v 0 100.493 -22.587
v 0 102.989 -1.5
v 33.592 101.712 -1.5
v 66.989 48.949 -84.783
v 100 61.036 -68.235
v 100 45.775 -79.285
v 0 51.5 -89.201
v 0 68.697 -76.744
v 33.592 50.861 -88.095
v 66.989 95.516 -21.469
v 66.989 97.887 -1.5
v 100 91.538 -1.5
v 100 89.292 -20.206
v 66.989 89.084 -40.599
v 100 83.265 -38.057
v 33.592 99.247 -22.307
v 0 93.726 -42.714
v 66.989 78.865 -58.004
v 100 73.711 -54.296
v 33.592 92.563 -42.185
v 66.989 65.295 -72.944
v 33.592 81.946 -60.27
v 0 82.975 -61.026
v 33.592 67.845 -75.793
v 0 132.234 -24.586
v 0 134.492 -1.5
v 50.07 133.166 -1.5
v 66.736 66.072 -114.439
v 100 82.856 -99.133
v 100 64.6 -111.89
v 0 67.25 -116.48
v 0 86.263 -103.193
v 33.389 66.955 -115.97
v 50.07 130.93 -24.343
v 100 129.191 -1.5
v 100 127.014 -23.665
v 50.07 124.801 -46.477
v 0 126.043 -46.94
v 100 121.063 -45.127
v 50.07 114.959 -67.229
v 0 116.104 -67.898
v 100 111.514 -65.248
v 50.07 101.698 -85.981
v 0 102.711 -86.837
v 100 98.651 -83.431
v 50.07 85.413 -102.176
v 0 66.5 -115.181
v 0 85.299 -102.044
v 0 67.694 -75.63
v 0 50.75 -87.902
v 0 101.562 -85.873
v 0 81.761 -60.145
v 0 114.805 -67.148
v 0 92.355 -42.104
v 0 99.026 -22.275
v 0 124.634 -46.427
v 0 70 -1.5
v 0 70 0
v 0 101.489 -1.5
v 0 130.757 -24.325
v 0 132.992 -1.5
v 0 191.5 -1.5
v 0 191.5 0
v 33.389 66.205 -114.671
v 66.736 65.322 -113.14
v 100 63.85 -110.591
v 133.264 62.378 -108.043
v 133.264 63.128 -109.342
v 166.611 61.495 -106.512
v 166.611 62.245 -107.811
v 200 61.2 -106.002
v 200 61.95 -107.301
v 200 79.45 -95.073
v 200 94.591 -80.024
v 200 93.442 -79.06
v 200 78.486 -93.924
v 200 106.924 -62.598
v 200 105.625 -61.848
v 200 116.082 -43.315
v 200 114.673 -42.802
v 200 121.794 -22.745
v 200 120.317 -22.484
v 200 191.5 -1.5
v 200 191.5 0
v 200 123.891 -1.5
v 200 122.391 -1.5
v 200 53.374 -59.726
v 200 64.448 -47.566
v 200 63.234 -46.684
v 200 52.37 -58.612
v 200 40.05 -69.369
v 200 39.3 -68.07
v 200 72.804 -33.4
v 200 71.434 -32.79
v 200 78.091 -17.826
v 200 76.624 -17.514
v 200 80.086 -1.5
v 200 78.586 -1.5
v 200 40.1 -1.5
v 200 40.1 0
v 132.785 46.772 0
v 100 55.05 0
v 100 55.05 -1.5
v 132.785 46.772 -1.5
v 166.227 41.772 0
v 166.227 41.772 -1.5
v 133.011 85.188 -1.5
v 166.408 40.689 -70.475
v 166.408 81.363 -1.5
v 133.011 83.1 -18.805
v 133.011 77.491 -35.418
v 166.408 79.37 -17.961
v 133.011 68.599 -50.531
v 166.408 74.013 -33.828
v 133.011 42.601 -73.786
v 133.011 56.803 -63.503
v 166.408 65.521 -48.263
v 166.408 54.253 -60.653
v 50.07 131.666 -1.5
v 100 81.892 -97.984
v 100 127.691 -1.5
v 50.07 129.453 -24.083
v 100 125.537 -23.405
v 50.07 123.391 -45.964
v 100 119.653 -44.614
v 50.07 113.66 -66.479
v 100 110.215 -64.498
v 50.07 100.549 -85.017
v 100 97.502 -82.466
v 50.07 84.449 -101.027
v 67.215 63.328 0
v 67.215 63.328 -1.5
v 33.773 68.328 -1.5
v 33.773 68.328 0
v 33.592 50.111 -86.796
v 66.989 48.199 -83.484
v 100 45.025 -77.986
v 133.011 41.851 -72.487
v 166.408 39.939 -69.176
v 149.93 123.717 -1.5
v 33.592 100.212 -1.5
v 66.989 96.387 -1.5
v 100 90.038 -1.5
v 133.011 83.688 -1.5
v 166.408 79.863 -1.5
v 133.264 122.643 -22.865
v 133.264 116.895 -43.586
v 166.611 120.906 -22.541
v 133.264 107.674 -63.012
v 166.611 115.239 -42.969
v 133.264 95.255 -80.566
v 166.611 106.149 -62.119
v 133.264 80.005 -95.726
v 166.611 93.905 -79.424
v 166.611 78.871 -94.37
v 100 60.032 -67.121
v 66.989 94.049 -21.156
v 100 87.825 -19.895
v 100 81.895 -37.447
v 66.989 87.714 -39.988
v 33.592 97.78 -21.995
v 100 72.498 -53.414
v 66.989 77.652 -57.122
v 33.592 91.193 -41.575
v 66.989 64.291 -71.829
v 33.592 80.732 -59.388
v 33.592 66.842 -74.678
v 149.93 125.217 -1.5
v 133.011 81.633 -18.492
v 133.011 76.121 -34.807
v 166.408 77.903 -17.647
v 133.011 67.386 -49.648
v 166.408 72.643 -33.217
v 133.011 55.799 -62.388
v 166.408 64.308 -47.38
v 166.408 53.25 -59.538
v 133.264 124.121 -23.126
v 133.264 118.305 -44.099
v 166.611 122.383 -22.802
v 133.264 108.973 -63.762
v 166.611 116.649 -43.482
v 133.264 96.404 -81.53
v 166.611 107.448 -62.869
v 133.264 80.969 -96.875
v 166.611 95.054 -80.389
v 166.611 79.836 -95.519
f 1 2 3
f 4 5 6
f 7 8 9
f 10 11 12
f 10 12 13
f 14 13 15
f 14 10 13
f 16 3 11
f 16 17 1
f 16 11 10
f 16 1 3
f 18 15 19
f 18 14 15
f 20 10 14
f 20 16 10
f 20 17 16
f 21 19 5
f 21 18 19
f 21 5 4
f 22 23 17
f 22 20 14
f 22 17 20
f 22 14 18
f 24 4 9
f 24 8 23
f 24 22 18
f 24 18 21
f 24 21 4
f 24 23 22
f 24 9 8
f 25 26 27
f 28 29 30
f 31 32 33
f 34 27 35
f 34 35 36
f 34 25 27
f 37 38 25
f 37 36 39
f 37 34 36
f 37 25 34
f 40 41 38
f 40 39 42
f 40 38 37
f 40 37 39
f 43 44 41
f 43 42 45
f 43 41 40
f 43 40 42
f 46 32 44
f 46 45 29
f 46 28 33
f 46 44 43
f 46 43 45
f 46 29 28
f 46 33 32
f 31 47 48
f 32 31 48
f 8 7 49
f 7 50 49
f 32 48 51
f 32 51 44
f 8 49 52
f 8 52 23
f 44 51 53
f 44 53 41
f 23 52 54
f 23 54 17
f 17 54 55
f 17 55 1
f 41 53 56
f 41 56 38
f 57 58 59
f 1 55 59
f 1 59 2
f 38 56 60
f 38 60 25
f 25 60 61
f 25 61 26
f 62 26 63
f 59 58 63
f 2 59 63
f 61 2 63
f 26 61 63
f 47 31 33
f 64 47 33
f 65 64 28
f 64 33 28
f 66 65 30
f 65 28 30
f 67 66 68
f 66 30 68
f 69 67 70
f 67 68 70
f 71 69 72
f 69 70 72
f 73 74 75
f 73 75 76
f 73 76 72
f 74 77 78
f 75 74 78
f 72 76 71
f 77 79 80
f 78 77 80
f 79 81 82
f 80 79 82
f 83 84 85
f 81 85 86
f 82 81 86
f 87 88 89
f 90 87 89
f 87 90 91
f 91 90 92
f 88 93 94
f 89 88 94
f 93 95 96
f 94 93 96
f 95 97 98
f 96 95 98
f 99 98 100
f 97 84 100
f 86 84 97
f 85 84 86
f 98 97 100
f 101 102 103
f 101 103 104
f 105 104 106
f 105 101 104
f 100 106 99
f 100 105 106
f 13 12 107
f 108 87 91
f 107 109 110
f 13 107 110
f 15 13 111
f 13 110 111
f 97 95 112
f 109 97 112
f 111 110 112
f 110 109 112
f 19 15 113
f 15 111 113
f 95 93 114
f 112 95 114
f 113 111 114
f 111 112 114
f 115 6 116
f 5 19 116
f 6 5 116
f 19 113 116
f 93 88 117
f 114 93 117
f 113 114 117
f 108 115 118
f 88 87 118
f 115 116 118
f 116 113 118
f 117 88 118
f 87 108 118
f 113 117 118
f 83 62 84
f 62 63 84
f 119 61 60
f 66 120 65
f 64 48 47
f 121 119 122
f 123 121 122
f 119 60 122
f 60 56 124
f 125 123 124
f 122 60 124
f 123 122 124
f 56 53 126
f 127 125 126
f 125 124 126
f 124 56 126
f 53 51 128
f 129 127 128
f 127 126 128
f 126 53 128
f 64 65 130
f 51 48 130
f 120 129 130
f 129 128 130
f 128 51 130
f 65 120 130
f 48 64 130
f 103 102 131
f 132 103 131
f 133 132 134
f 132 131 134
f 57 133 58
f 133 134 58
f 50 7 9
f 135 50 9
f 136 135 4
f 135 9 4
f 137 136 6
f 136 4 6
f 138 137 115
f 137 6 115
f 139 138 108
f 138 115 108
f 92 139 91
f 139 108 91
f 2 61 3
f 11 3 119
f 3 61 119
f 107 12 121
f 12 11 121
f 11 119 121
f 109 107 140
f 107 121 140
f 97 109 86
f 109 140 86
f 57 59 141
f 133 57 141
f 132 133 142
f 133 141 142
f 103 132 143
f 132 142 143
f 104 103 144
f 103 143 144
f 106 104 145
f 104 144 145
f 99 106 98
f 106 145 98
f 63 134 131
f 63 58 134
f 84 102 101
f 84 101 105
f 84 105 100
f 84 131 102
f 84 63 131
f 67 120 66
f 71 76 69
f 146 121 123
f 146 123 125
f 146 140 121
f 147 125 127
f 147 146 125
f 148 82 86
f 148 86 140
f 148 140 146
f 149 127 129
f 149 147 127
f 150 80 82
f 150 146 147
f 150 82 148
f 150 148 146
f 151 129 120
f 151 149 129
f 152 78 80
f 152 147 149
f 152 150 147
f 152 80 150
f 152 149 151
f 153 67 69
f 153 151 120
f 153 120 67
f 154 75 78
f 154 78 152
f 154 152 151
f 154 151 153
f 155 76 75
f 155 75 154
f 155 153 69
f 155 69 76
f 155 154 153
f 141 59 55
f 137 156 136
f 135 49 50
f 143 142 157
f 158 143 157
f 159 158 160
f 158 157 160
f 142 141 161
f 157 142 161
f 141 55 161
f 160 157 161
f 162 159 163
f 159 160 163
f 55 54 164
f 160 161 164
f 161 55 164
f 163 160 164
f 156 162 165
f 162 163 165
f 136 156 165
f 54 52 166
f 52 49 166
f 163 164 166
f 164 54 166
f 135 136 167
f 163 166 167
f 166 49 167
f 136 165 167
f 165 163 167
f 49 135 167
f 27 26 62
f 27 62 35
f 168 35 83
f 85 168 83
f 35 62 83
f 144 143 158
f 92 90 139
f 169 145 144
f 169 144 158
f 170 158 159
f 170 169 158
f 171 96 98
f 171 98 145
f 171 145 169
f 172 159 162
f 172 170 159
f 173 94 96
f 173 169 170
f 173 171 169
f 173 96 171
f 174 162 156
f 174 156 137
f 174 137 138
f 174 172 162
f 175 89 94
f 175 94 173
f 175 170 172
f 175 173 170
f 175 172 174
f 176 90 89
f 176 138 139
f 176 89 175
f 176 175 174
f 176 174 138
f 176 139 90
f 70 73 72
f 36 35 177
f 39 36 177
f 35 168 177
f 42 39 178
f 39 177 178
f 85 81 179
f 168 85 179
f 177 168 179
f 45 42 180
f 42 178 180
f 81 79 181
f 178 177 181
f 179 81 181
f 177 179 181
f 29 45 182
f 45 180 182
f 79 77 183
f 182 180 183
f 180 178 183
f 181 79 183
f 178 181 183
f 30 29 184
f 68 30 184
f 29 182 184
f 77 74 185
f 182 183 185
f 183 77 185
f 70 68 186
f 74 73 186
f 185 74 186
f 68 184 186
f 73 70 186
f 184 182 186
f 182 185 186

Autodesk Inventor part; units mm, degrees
ref_plane "YZ Plane" through (0, 0, 0) normal (1, 0, 0) x (0, 1, 0)
ref_plane "XZ Plane" through (0, 0, 0) normal (0, 1, 0) x (-1, 0, 0)
ref_plane "XY Plane" through (0, 0, 0) normal (0, 0, 1) x (1, 0, 0)
sketch "Skizze1" plane through (0, 0, 0) normal (0, 0, 1) x (1, 0, 0)
  line L0 (0, 0) -> (200, 0) construction
  line L1 (200, 0) -> (200, 40.1) construction
  line L2 (200, 40.1) -> (200, 41.6)
  line L3 (0, 0) -> (0, 70) construction
  line L4 (0, 70) -> (0, 71.5)
  arc A0 (100, 55.05) -> (0, 70) centre (0, -271.9232) ccw
  arc A1 (100, 55.05) -> (200, 40.1) centre (200, 382.0232) ccw
  arc A2 (100, 56.55) -> (0, 71.5) centre (0, -270.4232) ccw
  arc A3 (100, 56.55) -> (200, 41.6) centre (200, 383.5232) ccw
  line L5 (0, 71.5) -> (0, 101.5) construction
  line L6 (200, 41.6) -> (200, 78.6) construction
  line L7 (0, 101.5) -> (0, 103)
  line L8 (200, 78.6) -> (200, 80.1)
  line L9 (0, 103) -> (0, 133) construction
  line L10 (0, 133) -> (0, 134.5)
  line L11 (200, 80.1) -> (200, 122.4) construction
  line L12 (200, 122.4) -> (200, 123.9)
  arc A4 (100, 90.05) -> (200, 78.6) centre (200, 521.0062) ccw
  arc A5 (100, 91.55) -> (200, 80.1) centre (200, 522.5062) ccw
  arc A6 (100, 90.05) -> (0, 101.5) centre (0, -340.9062) ccw
  arc A7 (100, 91.55) -> (0, 103) centre (0, -339.4062) ccw
  arc A8 (100, 129.2) -> (200, 123.9) centre (200, 1069.9462) ccw
  arc A9 (100, 127.7) -> (0, 133) centre (0, -813.0462) ccw
  arc A10 (100, 127.7) -> (200, 122.4) centre (200, 1068.4462) ccw
  arc A11 (100, 129.2) -> (0, 134.5) centre (0, -811.5462) ccw
  line L13 (0, 0) -> (0, 190) construction
  line L14 (0, 190) -> (200, 190) construction
  line L15 (200, 190) -> (200, 191.5) construction
  line L16 (0, 190) -> (0, 191.5) construction
  line L17 (0, 191.5) -> (200, 191.5) construction
  line L18 (0, 0) -> (200, 0)
  point P0 (143.9749, 47.5506)
  point P1 (136.2206, 124.2462)
  point P2 (104.2284, 54.3303)
  dimension "d0" = 200
  dimension "d1" = 40.1
  dimension "d2" = 1.5
  dimension "d3" = 70
  dimension "d4" = 1.5
  dimension "d5" = 30
  dimension "d6" = 37
  dimension "d7" = 1.5
  dimension "d8" = 1.5
  dimension "d9" = 30
  dimension "d10" = 1.5
  dimension "d11" = 42.3
  dimension "d12" = 1.5
  dimension "d13" = 100
  dimension "d14" = 100
  dimension "d15" = 100
  dimension "d56" = 190
  dimension "d57" = 200
  dimension "d58" = 90
  dimension "d59" = 1.5
  dimension "d60" = 1.5
  dimension "d61" = 200
  dimension "d89" = 55.5
revolve "Umdrehung1" add sketch "Skizze1" angle 60 about axis through (0, 0, 0) along (-1, 0, 0) contours L7 A7 A5 L8 A4 A6 | L10 A11 A8 L12 A10 A9
sketch "Skizze3" plane through (0, 0, 0) normal (0, 0, 1) x (1, 0, 0)
  line L0 (200, 175.0528) -> (200, 191.5)
  line L1 (0, 191.5) -> (200, 191.5)
  arc A0 (100, 55.05) -> (0, 70) centre (0, -271.9232) ccw projected
  arc A1 (100, 55.05) -> (200, 40.1) centre (200, 382.0232) ccw projected
  line L2 (0, 70) -> (0, 191.5)
  line L3 (200, 191.5) -> (200, 40.1)
  point P0 (0, 0)
  point P1 (0, 0)
  point P2 (0, 0)
  point P3 (143.9749, 47.5506)
  point P4 (136.2206, 124.2462)
  point P5 (104.2284, 54.3303)
  point P6 (0, 0)
  dimension "d90" = 191.5
  dimension "d91" = 200
extrude "Extrusion1" add sketch "Skizze3" against normal blind 1.5
properties part number "Diffusoren mit Trennwand"
